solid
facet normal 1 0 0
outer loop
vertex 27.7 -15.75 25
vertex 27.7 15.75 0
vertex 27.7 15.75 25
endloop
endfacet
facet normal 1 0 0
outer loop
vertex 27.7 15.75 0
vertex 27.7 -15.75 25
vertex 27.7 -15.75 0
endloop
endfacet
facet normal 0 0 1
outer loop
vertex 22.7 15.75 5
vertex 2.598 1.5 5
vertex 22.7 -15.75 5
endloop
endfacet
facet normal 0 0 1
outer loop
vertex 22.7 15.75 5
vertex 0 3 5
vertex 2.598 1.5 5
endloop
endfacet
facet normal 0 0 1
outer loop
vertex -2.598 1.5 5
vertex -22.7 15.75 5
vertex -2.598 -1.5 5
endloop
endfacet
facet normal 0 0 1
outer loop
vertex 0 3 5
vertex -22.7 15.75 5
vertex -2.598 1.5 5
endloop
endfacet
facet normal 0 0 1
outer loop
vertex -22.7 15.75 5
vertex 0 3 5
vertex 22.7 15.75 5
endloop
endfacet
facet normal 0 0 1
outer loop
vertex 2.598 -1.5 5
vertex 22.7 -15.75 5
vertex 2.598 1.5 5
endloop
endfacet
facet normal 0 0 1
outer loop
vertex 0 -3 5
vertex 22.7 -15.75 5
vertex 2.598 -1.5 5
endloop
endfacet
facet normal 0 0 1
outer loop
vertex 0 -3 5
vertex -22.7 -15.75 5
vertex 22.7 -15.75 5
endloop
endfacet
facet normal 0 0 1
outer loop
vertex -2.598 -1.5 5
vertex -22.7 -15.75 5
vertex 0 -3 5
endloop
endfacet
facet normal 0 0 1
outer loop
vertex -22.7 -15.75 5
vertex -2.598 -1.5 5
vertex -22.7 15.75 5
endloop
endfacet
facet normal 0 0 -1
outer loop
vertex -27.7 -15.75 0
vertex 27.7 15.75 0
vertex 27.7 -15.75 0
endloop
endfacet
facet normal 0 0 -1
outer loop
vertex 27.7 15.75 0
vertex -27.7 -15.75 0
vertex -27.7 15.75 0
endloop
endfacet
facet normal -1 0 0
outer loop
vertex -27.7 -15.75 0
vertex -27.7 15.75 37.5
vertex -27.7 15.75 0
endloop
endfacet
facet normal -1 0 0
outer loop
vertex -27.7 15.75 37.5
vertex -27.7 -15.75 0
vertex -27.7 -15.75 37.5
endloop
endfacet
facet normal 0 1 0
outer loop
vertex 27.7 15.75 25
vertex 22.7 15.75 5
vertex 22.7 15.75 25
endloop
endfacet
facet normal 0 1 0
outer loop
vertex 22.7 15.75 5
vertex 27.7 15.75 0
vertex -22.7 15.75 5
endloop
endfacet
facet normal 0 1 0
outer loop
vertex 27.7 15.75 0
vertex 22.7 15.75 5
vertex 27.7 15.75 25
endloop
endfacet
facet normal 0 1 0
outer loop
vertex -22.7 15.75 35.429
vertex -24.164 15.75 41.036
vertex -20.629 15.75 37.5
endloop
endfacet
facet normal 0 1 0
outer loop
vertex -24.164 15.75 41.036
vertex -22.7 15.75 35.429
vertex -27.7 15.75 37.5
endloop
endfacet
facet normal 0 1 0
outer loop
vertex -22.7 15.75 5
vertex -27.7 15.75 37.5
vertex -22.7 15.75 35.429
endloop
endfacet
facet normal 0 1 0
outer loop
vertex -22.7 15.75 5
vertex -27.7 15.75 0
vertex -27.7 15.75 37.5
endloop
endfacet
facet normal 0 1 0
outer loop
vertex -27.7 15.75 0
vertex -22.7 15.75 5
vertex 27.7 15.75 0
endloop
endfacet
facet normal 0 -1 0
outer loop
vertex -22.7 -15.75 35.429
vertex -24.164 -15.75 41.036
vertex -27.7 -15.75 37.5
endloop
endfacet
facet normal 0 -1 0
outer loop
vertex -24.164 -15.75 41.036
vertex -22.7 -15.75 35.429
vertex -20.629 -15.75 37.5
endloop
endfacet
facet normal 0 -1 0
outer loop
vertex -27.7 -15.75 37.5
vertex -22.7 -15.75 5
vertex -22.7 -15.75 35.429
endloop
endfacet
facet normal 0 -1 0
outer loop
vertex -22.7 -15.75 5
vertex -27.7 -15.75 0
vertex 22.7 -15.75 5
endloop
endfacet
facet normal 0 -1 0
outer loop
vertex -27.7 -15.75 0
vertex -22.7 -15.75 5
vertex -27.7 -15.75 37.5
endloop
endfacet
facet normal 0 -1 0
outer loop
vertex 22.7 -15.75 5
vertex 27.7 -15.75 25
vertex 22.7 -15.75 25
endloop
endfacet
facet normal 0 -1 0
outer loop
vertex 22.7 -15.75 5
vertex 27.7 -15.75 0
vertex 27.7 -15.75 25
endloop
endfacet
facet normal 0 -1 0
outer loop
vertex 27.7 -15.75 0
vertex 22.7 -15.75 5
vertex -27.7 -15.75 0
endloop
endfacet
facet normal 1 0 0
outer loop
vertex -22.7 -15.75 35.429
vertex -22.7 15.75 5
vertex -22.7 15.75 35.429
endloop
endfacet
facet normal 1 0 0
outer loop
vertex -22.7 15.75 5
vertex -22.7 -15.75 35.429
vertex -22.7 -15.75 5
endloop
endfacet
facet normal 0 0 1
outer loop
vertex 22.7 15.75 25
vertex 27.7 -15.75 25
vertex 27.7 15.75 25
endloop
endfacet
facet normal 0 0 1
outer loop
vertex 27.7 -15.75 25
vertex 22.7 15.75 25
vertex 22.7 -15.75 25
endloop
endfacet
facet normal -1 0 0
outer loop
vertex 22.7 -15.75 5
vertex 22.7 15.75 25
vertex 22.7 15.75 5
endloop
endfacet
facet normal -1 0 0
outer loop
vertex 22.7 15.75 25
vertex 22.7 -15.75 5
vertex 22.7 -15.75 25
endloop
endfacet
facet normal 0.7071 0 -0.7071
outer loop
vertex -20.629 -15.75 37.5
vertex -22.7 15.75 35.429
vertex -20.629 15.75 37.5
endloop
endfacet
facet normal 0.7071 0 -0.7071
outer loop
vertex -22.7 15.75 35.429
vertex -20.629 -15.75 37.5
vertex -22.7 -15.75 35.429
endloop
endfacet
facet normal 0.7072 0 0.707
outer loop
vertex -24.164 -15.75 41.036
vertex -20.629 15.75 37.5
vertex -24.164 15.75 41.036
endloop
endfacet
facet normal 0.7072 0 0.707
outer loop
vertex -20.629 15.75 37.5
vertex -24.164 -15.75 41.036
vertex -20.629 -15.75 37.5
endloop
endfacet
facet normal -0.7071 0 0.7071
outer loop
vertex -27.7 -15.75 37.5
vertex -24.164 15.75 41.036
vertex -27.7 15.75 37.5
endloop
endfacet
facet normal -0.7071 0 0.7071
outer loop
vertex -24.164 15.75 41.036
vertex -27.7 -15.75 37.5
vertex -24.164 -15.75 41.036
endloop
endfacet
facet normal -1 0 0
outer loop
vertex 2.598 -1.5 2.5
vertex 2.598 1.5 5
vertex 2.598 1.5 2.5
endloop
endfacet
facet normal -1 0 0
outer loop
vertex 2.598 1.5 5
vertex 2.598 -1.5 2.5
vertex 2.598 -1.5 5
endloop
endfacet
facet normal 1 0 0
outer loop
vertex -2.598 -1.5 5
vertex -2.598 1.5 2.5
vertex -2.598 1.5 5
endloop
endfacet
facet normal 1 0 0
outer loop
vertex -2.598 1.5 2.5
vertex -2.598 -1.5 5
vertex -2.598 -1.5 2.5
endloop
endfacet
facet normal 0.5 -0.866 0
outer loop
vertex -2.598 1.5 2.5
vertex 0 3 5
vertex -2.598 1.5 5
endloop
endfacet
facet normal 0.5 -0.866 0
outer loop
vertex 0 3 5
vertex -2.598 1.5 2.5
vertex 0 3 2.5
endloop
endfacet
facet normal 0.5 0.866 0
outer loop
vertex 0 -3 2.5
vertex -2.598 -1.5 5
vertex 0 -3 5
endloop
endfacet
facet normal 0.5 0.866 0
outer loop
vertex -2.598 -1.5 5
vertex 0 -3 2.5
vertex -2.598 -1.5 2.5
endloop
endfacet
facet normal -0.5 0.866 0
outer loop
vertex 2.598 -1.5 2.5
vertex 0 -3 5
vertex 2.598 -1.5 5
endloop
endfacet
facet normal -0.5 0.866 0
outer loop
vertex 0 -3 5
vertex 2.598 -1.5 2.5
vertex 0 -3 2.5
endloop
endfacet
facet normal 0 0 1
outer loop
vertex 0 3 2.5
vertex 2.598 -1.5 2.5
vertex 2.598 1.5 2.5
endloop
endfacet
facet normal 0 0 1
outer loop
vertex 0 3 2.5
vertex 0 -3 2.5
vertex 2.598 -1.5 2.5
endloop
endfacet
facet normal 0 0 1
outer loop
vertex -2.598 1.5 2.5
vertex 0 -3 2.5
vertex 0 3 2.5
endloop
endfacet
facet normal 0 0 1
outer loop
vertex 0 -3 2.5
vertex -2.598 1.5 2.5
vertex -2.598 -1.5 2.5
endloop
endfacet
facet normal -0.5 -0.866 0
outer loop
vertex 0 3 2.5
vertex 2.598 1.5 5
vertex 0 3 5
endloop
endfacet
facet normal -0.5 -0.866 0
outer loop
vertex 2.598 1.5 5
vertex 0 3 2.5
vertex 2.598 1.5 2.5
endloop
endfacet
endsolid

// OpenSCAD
module c_bracket() {
    difference() {
        union() {
            // Main U-shape
            translate([-27.7, -15.75, 0])
            cube([55.4, 31.5, 5]);

            // Taller leg
            translate([-27.7, -15.75, 5])
            cube([5, 31.5, 32.5]);

            // Shorter leg
            translate([22.7, -15.75, 5])
            cube([5, 31.5, 20]);

            // Chamfer on taller leg
            translate([-27.7, -15.75, 37.5])
            rotate([0, 45, 0])
            cube([5, 31.5, 5]);
        }

        // Hexagonal hole
        translate([0, 0, 2.5])
        rotate([0, 0, 90])
        cylinder(h=5, r=3, $fn=6);
    }
}

c_bracket();
